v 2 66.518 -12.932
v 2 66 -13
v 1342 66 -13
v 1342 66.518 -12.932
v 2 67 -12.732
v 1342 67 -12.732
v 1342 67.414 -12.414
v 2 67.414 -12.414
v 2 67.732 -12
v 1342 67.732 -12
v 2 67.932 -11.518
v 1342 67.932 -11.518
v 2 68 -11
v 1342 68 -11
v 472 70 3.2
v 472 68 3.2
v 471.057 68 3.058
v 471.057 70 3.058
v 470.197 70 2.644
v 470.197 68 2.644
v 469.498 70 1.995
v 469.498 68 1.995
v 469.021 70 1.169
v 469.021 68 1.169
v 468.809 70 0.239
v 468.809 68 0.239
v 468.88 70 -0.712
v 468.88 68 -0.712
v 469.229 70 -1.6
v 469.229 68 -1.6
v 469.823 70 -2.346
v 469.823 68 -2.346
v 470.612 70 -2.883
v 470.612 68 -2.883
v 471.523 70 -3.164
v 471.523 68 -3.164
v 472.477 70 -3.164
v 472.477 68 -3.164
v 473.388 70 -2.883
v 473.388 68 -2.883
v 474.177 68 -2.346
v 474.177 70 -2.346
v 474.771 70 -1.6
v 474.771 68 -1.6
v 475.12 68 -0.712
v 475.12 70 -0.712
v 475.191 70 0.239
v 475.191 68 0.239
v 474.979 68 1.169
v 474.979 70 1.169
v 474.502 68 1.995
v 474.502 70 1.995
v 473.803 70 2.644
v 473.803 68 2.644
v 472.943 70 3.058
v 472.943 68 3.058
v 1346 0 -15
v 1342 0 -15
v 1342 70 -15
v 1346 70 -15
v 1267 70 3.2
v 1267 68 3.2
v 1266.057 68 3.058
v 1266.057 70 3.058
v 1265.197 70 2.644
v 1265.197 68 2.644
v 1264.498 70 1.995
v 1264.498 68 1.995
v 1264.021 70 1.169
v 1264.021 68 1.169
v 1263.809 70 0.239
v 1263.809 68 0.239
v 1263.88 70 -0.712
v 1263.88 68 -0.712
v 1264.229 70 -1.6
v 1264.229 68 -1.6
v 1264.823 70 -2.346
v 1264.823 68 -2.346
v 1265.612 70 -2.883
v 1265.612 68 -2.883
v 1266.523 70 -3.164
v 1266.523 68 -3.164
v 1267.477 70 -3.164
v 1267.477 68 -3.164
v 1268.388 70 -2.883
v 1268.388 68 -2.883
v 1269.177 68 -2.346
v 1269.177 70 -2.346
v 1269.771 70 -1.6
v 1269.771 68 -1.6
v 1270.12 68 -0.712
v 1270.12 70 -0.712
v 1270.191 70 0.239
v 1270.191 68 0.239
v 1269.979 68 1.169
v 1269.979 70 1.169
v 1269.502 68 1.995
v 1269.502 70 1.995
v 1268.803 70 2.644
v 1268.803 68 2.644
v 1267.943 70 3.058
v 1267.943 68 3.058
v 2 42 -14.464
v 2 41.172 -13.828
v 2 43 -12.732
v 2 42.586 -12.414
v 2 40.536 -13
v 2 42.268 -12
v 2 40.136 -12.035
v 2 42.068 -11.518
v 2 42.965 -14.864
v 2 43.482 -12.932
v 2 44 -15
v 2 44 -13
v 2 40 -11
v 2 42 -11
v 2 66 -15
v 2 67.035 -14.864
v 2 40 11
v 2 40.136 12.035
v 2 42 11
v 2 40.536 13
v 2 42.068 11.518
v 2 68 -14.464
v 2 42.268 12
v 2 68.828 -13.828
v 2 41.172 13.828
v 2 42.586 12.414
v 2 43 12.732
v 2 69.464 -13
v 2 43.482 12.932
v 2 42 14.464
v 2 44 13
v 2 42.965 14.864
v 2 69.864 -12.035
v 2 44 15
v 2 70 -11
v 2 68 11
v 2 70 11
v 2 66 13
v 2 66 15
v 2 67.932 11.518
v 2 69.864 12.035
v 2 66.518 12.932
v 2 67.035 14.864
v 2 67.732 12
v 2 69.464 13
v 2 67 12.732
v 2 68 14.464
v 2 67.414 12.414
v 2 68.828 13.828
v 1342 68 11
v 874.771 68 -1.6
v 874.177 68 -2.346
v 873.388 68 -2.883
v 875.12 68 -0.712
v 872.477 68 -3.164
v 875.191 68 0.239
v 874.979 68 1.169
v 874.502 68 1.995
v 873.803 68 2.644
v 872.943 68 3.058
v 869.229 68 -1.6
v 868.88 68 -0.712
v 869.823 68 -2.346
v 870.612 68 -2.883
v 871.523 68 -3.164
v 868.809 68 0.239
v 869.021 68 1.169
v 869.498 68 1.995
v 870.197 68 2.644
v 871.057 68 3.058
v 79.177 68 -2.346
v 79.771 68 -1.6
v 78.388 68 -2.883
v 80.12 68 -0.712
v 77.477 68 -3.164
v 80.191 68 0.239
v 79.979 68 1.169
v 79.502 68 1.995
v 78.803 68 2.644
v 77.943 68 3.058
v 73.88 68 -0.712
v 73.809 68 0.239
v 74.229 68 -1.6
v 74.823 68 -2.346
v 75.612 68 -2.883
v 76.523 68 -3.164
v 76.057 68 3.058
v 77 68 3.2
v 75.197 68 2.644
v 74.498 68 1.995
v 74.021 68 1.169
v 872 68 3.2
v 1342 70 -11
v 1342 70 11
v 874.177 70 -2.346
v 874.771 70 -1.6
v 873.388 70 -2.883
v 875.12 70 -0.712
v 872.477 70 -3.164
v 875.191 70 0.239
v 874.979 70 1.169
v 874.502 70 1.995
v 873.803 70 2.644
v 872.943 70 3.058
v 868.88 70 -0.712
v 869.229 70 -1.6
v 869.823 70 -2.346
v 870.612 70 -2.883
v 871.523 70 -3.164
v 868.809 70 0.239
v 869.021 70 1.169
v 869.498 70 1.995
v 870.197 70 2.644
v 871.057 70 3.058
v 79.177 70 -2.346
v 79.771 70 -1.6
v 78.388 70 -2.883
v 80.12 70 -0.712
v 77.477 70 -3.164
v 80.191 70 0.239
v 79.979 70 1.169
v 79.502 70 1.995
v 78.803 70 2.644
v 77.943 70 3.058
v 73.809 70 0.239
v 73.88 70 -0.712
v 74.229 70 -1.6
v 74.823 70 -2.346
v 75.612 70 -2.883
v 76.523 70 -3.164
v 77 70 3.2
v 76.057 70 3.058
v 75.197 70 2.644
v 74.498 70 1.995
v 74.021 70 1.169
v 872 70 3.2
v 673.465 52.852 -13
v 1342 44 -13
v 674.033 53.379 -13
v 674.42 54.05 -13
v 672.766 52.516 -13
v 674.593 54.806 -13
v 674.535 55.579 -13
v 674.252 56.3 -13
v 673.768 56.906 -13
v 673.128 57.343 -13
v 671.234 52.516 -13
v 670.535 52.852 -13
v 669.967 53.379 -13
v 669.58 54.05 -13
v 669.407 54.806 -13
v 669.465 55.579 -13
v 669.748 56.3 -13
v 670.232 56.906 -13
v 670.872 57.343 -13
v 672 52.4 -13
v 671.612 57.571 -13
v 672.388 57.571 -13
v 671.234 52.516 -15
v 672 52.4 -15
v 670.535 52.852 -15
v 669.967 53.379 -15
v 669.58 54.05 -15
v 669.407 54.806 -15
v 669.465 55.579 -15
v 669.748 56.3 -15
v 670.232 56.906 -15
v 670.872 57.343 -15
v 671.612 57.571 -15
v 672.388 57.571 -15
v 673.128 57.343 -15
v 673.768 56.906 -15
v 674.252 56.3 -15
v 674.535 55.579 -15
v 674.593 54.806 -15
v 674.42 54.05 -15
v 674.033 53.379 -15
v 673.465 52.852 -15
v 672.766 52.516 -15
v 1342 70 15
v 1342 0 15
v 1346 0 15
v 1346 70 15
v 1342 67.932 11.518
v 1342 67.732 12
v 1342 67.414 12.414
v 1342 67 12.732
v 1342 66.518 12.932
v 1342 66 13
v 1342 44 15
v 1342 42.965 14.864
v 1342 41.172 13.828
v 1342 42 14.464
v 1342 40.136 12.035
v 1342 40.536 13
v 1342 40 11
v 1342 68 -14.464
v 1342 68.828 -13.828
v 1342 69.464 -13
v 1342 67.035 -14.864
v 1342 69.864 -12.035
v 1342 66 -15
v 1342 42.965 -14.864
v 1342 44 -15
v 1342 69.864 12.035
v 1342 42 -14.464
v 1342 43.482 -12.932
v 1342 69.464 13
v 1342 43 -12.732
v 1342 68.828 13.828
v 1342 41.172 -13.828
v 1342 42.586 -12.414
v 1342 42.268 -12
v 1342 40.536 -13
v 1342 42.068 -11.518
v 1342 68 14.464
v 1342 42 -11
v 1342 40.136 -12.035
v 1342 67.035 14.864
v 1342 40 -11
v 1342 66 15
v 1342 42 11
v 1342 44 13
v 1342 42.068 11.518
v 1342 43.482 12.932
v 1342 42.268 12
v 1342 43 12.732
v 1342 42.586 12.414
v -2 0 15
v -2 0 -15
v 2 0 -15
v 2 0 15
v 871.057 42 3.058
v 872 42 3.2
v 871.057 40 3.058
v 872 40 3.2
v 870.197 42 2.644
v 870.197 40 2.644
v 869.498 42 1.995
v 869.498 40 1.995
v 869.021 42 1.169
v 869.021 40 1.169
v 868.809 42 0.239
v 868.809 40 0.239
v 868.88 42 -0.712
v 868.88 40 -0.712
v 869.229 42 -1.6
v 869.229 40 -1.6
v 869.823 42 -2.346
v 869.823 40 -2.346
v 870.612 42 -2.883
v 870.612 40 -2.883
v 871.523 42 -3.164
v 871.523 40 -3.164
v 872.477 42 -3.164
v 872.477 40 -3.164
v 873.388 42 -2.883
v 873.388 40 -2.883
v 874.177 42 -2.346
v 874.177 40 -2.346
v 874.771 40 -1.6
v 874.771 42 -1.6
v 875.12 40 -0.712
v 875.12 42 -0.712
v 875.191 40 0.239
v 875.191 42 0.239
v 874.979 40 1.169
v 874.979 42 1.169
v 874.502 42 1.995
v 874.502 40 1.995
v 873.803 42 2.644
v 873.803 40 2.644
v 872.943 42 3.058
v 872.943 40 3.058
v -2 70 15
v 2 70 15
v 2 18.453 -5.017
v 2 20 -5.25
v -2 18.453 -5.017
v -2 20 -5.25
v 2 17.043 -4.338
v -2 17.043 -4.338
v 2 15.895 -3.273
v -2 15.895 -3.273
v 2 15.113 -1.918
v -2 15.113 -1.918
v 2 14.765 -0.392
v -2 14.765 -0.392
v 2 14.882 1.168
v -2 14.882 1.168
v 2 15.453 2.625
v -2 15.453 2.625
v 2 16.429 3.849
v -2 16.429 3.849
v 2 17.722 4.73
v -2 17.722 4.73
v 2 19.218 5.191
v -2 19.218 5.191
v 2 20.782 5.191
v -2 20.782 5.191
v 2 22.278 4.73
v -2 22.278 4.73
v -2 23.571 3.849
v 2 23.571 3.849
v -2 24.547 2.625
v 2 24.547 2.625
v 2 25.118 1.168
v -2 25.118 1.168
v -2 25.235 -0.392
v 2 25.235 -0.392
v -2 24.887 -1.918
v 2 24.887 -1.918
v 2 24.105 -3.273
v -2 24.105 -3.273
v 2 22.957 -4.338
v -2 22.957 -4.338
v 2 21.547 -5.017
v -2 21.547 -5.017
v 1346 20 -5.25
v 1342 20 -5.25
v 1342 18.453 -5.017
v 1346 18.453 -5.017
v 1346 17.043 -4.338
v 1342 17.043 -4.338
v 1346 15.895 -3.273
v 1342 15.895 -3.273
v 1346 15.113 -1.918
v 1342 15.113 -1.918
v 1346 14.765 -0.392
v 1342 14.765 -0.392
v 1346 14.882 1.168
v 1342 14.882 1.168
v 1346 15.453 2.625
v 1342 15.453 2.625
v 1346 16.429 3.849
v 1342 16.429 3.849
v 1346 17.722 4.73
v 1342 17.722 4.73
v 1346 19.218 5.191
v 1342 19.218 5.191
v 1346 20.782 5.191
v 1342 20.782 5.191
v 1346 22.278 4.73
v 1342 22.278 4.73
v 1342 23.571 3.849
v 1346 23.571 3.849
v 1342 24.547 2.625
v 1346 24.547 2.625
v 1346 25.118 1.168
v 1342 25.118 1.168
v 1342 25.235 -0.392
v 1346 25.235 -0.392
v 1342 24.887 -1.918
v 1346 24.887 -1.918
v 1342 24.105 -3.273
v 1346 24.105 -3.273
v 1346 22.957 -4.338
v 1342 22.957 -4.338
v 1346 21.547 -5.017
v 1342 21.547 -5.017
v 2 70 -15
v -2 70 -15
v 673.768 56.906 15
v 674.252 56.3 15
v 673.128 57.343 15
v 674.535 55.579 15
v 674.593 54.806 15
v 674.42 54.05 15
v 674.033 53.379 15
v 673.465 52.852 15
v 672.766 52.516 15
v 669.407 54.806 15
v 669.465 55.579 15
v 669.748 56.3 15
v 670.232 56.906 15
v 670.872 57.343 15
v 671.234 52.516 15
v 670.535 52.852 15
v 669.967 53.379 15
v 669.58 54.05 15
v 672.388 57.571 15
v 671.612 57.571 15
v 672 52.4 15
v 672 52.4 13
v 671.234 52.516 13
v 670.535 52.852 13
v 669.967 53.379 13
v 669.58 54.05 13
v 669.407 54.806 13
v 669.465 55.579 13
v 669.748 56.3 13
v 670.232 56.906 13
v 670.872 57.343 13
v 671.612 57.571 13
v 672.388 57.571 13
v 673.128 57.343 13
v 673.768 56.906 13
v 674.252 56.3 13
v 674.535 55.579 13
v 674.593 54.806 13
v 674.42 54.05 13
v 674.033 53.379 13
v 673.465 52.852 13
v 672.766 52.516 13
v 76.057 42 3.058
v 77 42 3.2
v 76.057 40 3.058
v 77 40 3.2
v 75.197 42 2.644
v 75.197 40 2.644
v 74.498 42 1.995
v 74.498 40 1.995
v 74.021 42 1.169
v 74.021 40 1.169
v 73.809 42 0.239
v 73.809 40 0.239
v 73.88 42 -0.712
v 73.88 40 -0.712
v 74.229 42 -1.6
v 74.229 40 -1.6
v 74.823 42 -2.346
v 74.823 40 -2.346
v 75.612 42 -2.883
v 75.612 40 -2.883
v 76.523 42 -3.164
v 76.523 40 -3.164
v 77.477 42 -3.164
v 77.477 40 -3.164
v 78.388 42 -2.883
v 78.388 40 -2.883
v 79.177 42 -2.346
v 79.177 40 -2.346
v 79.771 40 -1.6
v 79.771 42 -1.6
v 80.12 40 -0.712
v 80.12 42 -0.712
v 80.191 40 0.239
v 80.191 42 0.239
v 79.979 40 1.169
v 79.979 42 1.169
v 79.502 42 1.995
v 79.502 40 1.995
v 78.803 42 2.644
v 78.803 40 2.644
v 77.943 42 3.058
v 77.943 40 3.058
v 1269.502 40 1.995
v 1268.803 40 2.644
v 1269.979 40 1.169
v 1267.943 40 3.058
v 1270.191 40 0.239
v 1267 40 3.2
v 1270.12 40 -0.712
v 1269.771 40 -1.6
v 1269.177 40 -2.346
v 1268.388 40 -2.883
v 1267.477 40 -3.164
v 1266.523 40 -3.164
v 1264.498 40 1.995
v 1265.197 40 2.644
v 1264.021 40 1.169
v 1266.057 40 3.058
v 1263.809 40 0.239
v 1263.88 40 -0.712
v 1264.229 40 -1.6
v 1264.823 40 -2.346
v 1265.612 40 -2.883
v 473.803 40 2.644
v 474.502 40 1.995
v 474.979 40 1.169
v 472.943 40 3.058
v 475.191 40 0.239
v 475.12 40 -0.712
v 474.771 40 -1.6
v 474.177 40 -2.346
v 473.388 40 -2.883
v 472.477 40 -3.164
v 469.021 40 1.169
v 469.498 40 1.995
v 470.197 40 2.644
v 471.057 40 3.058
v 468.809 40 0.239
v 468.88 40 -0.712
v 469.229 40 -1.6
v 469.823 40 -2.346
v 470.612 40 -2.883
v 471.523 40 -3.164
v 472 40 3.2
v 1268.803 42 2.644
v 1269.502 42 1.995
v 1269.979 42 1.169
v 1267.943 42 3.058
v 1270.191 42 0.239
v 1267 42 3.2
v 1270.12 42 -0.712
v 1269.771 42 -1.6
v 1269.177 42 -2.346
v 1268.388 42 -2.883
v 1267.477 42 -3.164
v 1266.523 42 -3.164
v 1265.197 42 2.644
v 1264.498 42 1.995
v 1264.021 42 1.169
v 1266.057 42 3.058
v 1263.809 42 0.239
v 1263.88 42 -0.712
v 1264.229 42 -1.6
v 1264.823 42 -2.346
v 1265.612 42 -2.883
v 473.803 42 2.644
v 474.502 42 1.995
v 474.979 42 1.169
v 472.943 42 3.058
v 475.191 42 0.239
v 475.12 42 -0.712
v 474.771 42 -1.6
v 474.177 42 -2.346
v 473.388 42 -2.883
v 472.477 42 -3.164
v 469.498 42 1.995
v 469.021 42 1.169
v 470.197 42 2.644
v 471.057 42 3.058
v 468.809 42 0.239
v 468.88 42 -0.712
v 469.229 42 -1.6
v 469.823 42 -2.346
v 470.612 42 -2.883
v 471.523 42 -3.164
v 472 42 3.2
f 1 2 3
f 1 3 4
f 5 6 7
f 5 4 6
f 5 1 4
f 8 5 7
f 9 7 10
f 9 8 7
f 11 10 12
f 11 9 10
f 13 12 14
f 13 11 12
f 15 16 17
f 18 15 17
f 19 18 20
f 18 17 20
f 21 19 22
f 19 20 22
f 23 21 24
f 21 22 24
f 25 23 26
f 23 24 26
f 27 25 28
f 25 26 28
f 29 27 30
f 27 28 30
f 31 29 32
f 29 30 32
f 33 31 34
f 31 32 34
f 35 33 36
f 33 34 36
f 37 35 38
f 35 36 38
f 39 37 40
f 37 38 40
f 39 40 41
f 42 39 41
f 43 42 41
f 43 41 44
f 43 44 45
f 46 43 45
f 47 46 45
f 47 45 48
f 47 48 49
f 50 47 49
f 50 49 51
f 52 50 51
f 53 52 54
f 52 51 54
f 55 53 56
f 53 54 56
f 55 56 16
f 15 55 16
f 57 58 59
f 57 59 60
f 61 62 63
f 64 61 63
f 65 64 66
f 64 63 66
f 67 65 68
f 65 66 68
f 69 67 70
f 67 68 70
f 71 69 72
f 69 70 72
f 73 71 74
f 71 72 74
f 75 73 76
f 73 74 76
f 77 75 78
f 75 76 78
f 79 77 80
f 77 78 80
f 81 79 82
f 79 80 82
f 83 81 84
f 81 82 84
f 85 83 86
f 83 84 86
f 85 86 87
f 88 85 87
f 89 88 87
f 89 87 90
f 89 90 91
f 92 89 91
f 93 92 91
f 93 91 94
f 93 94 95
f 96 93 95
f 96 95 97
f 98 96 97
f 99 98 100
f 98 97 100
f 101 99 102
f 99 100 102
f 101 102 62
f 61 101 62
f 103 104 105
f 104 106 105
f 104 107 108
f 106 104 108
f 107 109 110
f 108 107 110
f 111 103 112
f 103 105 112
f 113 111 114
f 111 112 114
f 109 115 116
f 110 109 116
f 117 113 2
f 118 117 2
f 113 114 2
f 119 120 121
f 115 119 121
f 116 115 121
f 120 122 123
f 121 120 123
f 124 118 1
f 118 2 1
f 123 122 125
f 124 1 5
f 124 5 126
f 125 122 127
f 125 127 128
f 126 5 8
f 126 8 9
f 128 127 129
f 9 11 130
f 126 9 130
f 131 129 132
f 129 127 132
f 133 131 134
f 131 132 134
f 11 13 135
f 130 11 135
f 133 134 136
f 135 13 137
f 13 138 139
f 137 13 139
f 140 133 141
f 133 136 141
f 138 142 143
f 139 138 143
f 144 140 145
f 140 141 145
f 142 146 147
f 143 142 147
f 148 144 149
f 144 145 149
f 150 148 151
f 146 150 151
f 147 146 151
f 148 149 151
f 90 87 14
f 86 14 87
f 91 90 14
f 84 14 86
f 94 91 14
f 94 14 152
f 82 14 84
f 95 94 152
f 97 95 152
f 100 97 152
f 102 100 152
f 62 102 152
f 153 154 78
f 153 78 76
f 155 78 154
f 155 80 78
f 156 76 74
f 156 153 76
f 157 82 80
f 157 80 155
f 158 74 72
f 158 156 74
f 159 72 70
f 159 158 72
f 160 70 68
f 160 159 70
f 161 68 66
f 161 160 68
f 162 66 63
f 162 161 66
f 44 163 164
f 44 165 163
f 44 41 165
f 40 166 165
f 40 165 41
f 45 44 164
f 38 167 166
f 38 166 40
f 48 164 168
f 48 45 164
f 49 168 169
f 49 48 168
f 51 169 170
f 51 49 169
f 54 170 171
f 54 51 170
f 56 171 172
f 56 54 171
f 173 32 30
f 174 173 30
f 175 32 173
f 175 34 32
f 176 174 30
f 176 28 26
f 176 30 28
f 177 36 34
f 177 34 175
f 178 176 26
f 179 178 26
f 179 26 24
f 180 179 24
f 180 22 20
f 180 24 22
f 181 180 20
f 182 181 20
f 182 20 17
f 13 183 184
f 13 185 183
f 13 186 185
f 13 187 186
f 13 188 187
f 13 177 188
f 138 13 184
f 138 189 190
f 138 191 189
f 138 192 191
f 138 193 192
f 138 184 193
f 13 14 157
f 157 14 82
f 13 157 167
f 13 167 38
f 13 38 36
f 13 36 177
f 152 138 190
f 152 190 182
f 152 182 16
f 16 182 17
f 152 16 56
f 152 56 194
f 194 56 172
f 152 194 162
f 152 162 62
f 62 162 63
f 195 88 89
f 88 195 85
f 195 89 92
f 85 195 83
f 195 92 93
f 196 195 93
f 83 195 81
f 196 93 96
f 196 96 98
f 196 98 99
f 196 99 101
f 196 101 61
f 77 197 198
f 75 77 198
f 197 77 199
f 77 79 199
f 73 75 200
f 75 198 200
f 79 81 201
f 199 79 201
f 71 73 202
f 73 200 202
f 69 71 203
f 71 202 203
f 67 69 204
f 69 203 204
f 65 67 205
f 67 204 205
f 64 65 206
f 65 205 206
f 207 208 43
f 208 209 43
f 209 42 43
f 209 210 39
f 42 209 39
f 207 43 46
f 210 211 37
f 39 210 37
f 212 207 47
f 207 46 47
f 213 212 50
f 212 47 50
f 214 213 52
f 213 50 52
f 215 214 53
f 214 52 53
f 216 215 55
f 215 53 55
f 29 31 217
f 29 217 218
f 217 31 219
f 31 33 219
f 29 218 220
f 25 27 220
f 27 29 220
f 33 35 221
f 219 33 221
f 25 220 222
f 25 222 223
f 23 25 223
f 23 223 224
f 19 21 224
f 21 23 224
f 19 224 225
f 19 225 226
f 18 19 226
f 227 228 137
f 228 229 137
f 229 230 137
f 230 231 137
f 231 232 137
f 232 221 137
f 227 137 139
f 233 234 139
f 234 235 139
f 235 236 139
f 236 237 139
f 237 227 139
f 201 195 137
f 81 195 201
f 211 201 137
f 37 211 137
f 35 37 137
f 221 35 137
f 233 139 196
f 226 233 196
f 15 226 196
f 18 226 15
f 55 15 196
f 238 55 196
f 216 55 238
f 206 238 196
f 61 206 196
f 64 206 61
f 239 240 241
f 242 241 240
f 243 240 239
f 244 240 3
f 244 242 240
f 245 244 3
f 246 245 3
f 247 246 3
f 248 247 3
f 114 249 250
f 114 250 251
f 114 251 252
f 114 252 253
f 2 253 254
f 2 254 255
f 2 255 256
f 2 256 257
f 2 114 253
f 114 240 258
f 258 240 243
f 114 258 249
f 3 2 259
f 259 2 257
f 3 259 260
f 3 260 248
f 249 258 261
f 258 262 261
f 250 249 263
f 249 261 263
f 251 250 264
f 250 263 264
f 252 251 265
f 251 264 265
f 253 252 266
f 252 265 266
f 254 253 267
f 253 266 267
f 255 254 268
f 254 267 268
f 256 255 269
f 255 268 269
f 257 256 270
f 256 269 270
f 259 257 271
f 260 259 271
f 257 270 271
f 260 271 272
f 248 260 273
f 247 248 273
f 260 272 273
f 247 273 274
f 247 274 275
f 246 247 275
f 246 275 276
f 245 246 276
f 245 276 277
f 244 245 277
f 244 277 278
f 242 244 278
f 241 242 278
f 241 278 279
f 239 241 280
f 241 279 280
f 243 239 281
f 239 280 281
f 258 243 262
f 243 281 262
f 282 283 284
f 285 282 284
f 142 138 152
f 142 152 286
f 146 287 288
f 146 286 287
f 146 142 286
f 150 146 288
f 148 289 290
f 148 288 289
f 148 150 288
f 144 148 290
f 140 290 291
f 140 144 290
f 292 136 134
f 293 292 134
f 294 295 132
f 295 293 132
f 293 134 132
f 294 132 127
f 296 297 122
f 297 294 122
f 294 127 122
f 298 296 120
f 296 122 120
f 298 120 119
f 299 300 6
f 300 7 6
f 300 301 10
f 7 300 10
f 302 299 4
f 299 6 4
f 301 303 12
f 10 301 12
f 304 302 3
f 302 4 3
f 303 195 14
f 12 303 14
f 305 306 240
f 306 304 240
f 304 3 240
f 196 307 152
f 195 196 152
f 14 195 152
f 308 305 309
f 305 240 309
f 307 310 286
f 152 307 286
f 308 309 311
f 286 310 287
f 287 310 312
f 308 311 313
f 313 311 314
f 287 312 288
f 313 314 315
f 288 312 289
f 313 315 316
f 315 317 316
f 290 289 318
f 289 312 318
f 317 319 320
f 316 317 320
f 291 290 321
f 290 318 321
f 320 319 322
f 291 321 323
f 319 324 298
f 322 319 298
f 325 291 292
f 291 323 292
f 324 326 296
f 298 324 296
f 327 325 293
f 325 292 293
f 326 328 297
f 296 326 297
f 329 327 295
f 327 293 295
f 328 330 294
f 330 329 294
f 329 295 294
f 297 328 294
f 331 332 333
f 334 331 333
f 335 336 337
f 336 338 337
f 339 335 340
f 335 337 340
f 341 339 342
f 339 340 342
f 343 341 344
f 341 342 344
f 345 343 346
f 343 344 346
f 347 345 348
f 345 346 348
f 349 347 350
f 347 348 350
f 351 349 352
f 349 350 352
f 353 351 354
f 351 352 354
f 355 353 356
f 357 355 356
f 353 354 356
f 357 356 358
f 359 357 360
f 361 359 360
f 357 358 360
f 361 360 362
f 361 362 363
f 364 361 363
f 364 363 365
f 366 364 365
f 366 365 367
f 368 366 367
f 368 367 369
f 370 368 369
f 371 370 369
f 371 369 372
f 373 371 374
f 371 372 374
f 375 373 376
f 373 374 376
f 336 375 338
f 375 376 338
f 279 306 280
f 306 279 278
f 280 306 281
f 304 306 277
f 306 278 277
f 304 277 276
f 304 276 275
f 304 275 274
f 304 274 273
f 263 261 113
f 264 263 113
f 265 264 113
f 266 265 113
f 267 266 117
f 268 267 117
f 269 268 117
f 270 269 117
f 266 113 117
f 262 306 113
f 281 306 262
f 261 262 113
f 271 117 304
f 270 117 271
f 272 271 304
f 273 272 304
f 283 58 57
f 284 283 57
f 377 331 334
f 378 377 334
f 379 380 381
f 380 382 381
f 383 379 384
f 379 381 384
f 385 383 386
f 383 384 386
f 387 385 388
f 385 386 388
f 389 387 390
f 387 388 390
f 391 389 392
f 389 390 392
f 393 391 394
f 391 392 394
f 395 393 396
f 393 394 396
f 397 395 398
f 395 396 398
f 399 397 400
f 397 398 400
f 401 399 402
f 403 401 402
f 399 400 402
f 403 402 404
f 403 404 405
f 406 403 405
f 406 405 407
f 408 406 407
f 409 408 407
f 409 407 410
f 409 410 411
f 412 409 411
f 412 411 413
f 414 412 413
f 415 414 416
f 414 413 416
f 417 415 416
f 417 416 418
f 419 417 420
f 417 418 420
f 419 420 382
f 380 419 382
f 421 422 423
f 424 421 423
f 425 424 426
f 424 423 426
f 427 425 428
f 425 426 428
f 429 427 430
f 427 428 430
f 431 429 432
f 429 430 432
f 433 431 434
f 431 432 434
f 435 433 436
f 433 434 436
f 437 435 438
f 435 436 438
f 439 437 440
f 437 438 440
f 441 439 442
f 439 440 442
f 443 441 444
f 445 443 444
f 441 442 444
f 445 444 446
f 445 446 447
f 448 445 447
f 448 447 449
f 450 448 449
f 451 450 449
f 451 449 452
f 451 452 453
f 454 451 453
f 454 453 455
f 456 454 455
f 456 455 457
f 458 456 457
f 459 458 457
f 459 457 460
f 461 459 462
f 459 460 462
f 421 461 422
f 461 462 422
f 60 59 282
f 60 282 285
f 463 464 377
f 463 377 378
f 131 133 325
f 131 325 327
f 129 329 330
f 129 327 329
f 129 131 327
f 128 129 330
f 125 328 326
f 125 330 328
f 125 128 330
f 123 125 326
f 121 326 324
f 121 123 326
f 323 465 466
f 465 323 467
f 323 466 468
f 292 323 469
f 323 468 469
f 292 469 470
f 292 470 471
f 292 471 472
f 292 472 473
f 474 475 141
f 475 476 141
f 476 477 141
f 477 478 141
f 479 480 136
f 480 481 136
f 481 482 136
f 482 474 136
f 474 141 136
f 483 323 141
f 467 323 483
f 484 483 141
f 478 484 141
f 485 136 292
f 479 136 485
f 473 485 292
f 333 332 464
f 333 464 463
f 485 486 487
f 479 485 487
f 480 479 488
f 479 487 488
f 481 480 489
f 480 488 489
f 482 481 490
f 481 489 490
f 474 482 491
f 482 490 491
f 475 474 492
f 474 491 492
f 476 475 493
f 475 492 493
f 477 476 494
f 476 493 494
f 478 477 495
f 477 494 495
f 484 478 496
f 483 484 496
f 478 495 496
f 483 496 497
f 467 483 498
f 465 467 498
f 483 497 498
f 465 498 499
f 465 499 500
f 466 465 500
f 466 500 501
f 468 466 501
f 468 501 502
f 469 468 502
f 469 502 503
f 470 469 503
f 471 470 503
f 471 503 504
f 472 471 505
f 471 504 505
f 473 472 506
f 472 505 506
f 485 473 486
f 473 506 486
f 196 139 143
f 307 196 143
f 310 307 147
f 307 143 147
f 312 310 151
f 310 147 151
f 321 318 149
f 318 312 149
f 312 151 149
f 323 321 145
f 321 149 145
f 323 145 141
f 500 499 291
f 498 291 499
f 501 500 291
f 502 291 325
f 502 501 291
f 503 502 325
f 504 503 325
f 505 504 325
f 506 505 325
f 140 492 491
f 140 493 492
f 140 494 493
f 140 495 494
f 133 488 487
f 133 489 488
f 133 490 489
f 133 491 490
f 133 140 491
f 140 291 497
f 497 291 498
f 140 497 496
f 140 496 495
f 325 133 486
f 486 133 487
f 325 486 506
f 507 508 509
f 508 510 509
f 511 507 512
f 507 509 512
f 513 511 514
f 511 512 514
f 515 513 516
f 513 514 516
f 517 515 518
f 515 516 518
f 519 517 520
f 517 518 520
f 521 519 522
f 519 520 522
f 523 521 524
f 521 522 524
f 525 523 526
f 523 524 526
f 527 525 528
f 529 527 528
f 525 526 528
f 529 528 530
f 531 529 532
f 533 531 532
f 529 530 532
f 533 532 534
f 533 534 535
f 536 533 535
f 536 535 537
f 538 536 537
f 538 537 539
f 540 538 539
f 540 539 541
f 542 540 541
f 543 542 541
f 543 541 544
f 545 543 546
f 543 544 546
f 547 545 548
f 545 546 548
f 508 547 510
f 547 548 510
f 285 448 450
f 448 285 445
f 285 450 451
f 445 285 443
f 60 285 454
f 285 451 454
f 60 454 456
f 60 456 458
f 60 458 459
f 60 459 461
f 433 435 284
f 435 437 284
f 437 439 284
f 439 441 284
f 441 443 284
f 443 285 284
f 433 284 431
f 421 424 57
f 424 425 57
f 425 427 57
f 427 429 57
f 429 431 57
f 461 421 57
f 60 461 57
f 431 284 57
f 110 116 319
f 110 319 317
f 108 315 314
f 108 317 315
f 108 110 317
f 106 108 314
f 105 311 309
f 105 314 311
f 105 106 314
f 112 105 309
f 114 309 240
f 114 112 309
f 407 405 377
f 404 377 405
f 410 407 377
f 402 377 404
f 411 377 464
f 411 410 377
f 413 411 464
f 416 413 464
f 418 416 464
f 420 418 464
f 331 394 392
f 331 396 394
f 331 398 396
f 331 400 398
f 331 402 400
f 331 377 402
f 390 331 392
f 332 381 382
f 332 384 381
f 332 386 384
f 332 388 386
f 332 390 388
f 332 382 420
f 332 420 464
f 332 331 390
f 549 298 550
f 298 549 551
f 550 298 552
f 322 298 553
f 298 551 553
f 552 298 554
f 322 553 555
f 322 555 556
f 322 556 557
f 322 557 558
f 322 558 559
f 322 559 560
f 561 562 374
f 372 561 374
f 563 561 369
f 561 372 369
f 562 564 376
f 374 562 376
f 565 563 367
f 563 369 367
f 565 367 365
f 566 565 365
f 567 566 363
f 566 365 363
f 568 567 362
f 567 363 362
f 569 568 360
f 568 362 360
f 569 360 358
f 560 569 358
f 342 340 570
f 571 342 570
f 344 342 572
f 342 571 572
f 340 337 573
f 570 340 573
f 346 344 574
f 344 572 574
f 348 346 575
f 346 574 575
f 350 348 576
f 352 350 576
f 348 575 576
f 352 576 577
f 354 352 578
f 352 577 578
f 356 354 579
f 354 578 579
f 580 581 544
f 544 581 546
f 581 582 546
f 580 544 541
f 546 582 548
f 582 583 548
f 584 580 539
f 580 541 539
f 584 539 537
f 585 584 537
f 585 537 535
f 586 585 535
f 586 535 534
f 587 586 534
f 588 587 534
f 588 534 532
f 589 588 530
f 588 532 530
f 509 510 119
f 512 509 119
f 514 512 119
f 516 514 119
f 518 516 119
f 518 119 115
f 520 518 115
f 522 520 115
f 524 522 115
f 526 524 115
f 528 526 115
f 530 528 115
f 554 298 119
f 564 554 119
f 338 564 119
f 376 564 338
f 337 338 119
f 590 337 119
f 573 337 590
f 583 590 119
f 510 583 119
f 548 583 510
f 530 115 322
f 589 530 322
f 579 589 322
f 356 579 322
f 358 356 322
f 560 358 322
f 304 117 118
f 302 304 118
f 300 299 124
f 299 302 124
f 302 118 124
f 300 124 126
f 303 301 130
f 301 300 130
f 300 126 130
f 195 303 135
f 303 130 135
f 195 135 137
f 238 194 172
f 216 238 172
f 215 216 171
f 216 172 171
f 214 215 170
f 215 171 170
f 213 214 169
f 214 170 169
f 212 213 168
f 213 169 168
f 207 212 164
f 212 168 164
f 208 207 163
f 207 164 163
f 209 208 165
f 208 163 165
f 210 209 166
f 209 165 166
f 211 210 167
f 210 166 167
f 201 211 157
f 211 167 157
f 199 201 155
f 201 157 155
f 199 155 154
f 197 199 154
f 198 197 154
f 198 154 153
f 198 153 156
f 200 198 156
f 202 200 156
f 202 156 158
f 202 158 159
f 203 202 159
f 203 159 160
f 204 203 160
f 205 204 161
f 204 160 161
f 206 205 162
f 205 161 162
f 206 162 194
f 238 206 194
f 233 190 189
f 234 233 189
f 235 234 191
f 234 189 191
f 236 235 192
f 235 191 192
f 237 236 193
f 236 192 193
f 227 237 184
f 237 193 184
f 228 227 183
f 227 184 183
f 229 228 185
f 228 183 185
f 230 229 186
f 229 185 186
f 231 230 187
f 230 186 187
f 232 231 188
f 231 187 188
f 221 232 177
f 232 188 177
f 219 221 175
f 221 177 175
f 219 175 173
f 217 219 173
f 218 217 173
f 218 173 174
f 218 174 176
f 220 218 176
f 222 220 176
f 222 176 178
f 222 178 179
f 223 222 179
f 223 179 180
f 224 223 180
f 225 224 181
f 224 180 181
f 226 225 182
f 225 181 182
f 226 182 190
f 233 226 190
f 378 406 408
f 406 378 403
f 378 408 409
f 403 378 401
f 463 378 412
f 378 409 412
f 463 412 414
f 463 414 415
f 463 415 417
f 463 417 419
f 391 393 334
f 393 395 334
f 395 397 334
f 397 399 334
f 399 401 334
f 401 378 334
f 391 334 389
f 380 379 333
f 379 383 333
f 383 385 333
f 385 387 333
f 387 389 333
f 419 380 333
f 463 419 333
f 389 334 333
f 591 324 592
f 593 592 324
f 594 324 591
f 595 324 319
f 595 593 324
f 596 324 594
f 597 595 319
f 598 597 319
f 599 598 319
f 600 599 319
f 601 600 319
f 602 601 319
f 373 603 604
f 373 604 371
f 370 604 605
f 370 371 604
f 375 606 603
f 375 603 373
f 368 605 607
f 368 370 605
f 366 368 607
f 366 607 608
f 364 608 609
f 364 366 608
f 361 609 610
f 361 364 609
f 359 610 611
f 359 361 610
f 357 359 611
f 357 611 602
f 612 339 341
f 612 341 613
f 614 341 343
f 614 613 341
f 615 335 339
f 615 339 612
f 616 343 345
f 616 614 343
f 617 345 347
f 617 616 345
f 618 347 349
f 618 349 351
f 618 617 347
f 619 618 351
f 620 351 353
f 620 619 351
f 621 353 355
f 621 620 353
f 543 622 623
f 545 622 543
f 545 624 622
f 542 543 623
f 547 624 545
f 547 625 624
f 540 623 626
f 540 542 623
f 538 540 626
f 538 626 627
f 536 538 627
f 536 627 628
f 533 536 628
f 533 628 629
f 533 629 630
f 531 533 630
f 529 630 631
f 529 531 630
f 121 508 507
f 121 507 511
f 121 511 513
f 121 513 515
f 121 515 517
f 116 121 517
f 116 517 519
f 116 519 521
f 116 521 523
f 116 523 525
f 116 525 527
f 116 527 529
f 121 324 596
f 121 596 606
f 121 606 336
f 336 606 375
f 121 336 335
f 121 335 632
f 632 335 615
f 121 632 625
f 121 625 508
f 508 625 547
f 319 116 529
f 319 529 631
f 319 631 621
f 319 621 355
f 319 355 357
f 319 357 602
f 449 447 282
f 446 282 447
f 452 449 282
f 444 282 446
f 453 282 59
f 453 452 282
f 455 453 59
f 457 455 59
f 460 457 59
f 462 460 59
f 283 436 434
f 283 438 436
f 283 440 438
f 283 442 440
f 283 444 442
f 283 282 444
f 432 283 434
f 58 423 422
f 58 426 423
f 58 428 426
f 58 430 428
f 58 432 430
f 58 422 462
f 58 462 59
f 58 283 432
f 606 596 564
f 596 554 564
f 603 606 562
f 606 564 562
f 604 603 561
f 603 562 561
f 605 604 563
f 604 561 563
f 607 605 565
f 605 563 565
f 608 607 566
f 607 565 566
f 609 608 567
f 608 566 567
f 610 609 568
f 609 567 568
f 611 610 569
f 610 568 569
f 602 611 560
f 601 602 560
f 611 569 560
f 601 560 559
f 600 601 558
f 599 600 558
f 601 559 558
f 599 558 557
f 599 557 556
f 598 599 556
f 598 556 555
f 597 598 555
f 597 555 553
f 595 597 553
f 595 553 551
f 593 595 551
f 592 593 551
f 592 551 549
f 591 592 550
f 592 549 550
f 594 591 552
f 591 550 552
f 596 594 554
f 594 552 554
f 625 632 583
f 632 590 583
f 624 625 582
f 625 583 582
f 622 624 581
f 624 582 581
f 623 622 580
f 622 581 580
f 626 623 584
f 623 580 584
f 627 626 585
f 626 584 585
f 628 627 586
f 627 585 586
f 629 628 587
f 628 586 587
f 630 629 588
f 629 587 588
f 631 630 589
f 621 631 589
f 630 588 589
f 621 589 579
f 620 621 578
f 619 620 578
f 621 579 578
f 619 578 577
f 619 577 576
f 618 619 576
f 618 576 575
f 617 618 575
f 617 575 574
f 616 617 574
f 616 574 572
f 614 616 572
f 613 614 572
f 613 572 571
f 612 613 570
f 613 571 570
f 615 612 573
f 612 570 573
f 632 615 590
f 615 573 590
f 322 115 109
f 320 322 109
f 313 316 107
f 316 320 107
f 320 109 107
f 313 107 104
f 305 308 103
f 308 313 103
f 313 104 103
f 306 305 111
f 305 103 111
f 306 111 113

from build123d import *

# Parameters (mm, degrees)
SQUARE_TUBE_CONFIGURED_30_X_30_X_2_DEPTH = 1344
SKETCH11_W                               = 4
SKETCH11_H                               = 30
STEEL_BAR_CONFIGURED_30_X_2_DEPTH        = 70
SKETCH11_ON_SEGMENT_2_W                  = 4
SKETCH11_ON_SEGMENT_2_H                  = 30
STEEL_BAR_CONFIGURED_30_X_2_2_DEPTH      = 70
SKETCH13_W                               = 5.25
SKETCH13_H                               = 1348
SKETCH18_W                               = 2.6
SKETCH18_H                               = 30
SKETCH22_W                               = 3.2
SKETCH22_H                               = 70
M6_CLEARANCE_HOLE_TABLE_MOUNT_AT_2_COUNT = 2
M6_CLEARANCE_HOLE_TABLE_MOUNT_AT_2_PITCH = 395
M6_CLEARANCE_HOLE_TABLE_MOUNT_AT_3_COUNT = 2
M6_CLEARANCE_HOLE_TABLE_MOUNT_AT_3_PITCH = 795
M6_CLEARANCE_HOLE_TABLE_MOUNT_AT_4_COUNT = 2
M6_CLEARANCE_HOLE_TABLE_MOUNT_AT_4_PITCH = 1190


with BuildPart() as part:
    # Sketch1 → Square tube - configured 30 X 30 X 2 (new body)
    with BuildSketch(Plane(origin=(0, 55, 0), x_dir=(0, 0, -1), z_dir=(1, 0, 0))):
        with BuildLine():
            Line((-11, -15), (11, -15))
            ThreePointArc((11, -15), (13.828427125, -13.828427125), (15, -11))
            Line((15, -11), (15, 11))
            ThreePointArc((15, 11), (13.828427125, 13.828427125), (11, 15))
            Line((11, 15), (-11, 15))
            ThreePointArc((-11, 15), (-13.828427125, 13.828427125), (-15, 11))
            Line((-15, 11), (-15, -11))
            ThreePointArc((-15, -11), (-13.828427125, -13.828427125), (-11, -15))
        make_face()
        with BuildLine():
            Line((-11, -13), (11, -13))
            ThreePointArc((11, -13), (12.414213562, -12.414213562), (13, -11))
            Line((13, -11), (13, 11))
            ThreePointArc((13, 11), (12.414213562, 12.414213562), (11, 13))
            Line((11, 13), (-11, 13))
            ThreePointArc((-11, 13), (-12.414213562, 12.414213562), (-13, 11))
            Line((-13, 11), (-13, -11))
            ThreePointArc((-13, -11), (-12.414213562, -12.414213562), (-11, -13))
        make_face(mode=Mode.SUBTRACT)
    extrude(amount=SQUARE_TUBE_CONFIGURED_30_X_30_X_2_DEPTH)

    # Trim/Extend1
    split(bisect_by=Plane(origin=(1342, 35, 0), x_dir=(0, -1, 0), z_dir=(-1, 0, 0)), keep=Keep.TOP)

    # Trim_Extend1 3
    split(bisect_by=Plane(origin=(2, 35, 0), x_dir=(0, 1, 0), z_dir=(1, 0, 0)), keep=Keep.TOP)

    # Sketch18 → Ø5.2 (5.2) Wall Mount Hole (revolve, cut)
    with BuildSketch(Plane(origin=(672, 55, 15), x_dir=(0, -1, 0), z_dir=(1, 0, 0))):
        with Locations((1.3, 15)):
            Rectangle(SKETCH18_W, SKETCH18_H)
    revolve(axis=Axis((672, 55, 21.35), (0, 0, -1)), mode=Mode.SUBTRACT)

    # Sketch22 → M6 Clearance Hole table mount (revolve, cut)
    with BuildSketch(Plane(origin=(77, 70, 0), x_dir=(0, 0, 1), z_dir=(1, 0, 0))):
        with Locations((1.6, 35)):
            Rectangle(SKETCH22_W, SKETCH22_H)
    m6_clearance_hole_table_mount = revolve(axis=Axis((77, 76.35, 0), (0, -1, 0)), mode=Mode.SUBTRACT)

    # M6 Clearance Hole table mount at 2: M6 Clearance Hole table mount ×2
    with Locations(*[(i * M6_CLEARANCE_HOLE_TABLE_MOUNT_AT_2_PITCH, 0, 0) for i in range(1, M6_CLEARANCE_HOLE_TABLE_MOUNT_AT_2_COUNT)]):
        add(m6_clearance_hole_table_mount, mode=Mode.SUBTRACT)

    # M6 Clearance Hole table mount at 3: M6 Clearance Hole table mount ×2
    with Locations(*[(i * M6_CLEARANCE_HOLE_TABLE_MOUNT_AT_3_PITCH, 0, 0) for i in range(1, M6_CLEARANCE_HOLE_TABLE_MOUNT_AT_3_COUNT)]):
        add(m6_clearance_hole_table_mount, mode=Mode.SUBTRACT)

    # M6 Clearance Hole table mount at 4: M6 Clearance Hole table mount ×2
    with Locations(*[(i * M6_CLEARANCE_HOLE_TABLE_MOUNT_AT_4_PITCH, 0, 0) for i in range(1, M6_CLEARANCE_HOLE_TABLE_MOUNT_AT_4_COUNT)]):
        add(m6_clearance_hole_table_mount, mode=Mode.SUBTRACT)


with BuildPart() as body_2:
    # Sketch11 → Steel bar - configured 30 X 2 (new body)
    with BuildSketch(Plane(origin=(0, 0, 0), x_dir=(1, 0, 0), z_dir=(0, 1, 0))):
        Rectangle(SKETCH11_W, SKETCH11_H)
    extrude(amount=STEEL_BAR_CONFIGURED_30_X_2_DEPTH)


with BuildPart() as body_3:
    # Sketch11 on segment 2 (carried to segment 2) → Steel bar - configured 30 X 2 2 (new body)
    with BuildSketch(Plane(origin=(1344, 0, 0), x_dir=(1, 0, 0), z_dir=(0, 1, 0))):
        Rectangle(SKETCH11_ON_SEGMENT_2_W, SKETCH11_ON_SEGMENT_2_H)
    extrude(amount=STEEL_BAR_CONFIGURED_30_X_2_2_DEPTH)


with BuildPart() as f_10_5_10_5_frame_mount_holes_tool:
    # Sketch13 → Ø10.5 (10.5) Frame Mount Holes (revolve)
    with BuildSketch(Plane(origin=(1346, 20, 0), x_dir=(0, 0, -1), z_dir=(0, 1, 0))):
        with Locations((2.625, 674)):
            Rectangle(SKETCH13_W, SKETCH13_H)
    revolve(axis=Axis((1352.35, 20, 0), (-1, 0, 0)))


with BuildPart() as body_2_1:
    add(body_2.part)

    # Ø10.5 (10.5) Frame Mount Holes: cut by f_10_5_10_5_frame_mount_holes_tool
    add(f_10_5_10_5_frame_mount_holes_tool.part, mode=Mode.SUBTRACT)


with BuildPart() as body_3_1:
    add(body_3.part)

    # Ø10.5 (10.5) Frame Mount Holes: cut by f_10_5_10_5_frame_mount_holes_tool
    add(f_10_5_10_5_frame_mount_holes_tool.part, mode=Mode.SUBTRACT)


solid = Compound([part.part, body_2_1.part, body_3_1.part])
